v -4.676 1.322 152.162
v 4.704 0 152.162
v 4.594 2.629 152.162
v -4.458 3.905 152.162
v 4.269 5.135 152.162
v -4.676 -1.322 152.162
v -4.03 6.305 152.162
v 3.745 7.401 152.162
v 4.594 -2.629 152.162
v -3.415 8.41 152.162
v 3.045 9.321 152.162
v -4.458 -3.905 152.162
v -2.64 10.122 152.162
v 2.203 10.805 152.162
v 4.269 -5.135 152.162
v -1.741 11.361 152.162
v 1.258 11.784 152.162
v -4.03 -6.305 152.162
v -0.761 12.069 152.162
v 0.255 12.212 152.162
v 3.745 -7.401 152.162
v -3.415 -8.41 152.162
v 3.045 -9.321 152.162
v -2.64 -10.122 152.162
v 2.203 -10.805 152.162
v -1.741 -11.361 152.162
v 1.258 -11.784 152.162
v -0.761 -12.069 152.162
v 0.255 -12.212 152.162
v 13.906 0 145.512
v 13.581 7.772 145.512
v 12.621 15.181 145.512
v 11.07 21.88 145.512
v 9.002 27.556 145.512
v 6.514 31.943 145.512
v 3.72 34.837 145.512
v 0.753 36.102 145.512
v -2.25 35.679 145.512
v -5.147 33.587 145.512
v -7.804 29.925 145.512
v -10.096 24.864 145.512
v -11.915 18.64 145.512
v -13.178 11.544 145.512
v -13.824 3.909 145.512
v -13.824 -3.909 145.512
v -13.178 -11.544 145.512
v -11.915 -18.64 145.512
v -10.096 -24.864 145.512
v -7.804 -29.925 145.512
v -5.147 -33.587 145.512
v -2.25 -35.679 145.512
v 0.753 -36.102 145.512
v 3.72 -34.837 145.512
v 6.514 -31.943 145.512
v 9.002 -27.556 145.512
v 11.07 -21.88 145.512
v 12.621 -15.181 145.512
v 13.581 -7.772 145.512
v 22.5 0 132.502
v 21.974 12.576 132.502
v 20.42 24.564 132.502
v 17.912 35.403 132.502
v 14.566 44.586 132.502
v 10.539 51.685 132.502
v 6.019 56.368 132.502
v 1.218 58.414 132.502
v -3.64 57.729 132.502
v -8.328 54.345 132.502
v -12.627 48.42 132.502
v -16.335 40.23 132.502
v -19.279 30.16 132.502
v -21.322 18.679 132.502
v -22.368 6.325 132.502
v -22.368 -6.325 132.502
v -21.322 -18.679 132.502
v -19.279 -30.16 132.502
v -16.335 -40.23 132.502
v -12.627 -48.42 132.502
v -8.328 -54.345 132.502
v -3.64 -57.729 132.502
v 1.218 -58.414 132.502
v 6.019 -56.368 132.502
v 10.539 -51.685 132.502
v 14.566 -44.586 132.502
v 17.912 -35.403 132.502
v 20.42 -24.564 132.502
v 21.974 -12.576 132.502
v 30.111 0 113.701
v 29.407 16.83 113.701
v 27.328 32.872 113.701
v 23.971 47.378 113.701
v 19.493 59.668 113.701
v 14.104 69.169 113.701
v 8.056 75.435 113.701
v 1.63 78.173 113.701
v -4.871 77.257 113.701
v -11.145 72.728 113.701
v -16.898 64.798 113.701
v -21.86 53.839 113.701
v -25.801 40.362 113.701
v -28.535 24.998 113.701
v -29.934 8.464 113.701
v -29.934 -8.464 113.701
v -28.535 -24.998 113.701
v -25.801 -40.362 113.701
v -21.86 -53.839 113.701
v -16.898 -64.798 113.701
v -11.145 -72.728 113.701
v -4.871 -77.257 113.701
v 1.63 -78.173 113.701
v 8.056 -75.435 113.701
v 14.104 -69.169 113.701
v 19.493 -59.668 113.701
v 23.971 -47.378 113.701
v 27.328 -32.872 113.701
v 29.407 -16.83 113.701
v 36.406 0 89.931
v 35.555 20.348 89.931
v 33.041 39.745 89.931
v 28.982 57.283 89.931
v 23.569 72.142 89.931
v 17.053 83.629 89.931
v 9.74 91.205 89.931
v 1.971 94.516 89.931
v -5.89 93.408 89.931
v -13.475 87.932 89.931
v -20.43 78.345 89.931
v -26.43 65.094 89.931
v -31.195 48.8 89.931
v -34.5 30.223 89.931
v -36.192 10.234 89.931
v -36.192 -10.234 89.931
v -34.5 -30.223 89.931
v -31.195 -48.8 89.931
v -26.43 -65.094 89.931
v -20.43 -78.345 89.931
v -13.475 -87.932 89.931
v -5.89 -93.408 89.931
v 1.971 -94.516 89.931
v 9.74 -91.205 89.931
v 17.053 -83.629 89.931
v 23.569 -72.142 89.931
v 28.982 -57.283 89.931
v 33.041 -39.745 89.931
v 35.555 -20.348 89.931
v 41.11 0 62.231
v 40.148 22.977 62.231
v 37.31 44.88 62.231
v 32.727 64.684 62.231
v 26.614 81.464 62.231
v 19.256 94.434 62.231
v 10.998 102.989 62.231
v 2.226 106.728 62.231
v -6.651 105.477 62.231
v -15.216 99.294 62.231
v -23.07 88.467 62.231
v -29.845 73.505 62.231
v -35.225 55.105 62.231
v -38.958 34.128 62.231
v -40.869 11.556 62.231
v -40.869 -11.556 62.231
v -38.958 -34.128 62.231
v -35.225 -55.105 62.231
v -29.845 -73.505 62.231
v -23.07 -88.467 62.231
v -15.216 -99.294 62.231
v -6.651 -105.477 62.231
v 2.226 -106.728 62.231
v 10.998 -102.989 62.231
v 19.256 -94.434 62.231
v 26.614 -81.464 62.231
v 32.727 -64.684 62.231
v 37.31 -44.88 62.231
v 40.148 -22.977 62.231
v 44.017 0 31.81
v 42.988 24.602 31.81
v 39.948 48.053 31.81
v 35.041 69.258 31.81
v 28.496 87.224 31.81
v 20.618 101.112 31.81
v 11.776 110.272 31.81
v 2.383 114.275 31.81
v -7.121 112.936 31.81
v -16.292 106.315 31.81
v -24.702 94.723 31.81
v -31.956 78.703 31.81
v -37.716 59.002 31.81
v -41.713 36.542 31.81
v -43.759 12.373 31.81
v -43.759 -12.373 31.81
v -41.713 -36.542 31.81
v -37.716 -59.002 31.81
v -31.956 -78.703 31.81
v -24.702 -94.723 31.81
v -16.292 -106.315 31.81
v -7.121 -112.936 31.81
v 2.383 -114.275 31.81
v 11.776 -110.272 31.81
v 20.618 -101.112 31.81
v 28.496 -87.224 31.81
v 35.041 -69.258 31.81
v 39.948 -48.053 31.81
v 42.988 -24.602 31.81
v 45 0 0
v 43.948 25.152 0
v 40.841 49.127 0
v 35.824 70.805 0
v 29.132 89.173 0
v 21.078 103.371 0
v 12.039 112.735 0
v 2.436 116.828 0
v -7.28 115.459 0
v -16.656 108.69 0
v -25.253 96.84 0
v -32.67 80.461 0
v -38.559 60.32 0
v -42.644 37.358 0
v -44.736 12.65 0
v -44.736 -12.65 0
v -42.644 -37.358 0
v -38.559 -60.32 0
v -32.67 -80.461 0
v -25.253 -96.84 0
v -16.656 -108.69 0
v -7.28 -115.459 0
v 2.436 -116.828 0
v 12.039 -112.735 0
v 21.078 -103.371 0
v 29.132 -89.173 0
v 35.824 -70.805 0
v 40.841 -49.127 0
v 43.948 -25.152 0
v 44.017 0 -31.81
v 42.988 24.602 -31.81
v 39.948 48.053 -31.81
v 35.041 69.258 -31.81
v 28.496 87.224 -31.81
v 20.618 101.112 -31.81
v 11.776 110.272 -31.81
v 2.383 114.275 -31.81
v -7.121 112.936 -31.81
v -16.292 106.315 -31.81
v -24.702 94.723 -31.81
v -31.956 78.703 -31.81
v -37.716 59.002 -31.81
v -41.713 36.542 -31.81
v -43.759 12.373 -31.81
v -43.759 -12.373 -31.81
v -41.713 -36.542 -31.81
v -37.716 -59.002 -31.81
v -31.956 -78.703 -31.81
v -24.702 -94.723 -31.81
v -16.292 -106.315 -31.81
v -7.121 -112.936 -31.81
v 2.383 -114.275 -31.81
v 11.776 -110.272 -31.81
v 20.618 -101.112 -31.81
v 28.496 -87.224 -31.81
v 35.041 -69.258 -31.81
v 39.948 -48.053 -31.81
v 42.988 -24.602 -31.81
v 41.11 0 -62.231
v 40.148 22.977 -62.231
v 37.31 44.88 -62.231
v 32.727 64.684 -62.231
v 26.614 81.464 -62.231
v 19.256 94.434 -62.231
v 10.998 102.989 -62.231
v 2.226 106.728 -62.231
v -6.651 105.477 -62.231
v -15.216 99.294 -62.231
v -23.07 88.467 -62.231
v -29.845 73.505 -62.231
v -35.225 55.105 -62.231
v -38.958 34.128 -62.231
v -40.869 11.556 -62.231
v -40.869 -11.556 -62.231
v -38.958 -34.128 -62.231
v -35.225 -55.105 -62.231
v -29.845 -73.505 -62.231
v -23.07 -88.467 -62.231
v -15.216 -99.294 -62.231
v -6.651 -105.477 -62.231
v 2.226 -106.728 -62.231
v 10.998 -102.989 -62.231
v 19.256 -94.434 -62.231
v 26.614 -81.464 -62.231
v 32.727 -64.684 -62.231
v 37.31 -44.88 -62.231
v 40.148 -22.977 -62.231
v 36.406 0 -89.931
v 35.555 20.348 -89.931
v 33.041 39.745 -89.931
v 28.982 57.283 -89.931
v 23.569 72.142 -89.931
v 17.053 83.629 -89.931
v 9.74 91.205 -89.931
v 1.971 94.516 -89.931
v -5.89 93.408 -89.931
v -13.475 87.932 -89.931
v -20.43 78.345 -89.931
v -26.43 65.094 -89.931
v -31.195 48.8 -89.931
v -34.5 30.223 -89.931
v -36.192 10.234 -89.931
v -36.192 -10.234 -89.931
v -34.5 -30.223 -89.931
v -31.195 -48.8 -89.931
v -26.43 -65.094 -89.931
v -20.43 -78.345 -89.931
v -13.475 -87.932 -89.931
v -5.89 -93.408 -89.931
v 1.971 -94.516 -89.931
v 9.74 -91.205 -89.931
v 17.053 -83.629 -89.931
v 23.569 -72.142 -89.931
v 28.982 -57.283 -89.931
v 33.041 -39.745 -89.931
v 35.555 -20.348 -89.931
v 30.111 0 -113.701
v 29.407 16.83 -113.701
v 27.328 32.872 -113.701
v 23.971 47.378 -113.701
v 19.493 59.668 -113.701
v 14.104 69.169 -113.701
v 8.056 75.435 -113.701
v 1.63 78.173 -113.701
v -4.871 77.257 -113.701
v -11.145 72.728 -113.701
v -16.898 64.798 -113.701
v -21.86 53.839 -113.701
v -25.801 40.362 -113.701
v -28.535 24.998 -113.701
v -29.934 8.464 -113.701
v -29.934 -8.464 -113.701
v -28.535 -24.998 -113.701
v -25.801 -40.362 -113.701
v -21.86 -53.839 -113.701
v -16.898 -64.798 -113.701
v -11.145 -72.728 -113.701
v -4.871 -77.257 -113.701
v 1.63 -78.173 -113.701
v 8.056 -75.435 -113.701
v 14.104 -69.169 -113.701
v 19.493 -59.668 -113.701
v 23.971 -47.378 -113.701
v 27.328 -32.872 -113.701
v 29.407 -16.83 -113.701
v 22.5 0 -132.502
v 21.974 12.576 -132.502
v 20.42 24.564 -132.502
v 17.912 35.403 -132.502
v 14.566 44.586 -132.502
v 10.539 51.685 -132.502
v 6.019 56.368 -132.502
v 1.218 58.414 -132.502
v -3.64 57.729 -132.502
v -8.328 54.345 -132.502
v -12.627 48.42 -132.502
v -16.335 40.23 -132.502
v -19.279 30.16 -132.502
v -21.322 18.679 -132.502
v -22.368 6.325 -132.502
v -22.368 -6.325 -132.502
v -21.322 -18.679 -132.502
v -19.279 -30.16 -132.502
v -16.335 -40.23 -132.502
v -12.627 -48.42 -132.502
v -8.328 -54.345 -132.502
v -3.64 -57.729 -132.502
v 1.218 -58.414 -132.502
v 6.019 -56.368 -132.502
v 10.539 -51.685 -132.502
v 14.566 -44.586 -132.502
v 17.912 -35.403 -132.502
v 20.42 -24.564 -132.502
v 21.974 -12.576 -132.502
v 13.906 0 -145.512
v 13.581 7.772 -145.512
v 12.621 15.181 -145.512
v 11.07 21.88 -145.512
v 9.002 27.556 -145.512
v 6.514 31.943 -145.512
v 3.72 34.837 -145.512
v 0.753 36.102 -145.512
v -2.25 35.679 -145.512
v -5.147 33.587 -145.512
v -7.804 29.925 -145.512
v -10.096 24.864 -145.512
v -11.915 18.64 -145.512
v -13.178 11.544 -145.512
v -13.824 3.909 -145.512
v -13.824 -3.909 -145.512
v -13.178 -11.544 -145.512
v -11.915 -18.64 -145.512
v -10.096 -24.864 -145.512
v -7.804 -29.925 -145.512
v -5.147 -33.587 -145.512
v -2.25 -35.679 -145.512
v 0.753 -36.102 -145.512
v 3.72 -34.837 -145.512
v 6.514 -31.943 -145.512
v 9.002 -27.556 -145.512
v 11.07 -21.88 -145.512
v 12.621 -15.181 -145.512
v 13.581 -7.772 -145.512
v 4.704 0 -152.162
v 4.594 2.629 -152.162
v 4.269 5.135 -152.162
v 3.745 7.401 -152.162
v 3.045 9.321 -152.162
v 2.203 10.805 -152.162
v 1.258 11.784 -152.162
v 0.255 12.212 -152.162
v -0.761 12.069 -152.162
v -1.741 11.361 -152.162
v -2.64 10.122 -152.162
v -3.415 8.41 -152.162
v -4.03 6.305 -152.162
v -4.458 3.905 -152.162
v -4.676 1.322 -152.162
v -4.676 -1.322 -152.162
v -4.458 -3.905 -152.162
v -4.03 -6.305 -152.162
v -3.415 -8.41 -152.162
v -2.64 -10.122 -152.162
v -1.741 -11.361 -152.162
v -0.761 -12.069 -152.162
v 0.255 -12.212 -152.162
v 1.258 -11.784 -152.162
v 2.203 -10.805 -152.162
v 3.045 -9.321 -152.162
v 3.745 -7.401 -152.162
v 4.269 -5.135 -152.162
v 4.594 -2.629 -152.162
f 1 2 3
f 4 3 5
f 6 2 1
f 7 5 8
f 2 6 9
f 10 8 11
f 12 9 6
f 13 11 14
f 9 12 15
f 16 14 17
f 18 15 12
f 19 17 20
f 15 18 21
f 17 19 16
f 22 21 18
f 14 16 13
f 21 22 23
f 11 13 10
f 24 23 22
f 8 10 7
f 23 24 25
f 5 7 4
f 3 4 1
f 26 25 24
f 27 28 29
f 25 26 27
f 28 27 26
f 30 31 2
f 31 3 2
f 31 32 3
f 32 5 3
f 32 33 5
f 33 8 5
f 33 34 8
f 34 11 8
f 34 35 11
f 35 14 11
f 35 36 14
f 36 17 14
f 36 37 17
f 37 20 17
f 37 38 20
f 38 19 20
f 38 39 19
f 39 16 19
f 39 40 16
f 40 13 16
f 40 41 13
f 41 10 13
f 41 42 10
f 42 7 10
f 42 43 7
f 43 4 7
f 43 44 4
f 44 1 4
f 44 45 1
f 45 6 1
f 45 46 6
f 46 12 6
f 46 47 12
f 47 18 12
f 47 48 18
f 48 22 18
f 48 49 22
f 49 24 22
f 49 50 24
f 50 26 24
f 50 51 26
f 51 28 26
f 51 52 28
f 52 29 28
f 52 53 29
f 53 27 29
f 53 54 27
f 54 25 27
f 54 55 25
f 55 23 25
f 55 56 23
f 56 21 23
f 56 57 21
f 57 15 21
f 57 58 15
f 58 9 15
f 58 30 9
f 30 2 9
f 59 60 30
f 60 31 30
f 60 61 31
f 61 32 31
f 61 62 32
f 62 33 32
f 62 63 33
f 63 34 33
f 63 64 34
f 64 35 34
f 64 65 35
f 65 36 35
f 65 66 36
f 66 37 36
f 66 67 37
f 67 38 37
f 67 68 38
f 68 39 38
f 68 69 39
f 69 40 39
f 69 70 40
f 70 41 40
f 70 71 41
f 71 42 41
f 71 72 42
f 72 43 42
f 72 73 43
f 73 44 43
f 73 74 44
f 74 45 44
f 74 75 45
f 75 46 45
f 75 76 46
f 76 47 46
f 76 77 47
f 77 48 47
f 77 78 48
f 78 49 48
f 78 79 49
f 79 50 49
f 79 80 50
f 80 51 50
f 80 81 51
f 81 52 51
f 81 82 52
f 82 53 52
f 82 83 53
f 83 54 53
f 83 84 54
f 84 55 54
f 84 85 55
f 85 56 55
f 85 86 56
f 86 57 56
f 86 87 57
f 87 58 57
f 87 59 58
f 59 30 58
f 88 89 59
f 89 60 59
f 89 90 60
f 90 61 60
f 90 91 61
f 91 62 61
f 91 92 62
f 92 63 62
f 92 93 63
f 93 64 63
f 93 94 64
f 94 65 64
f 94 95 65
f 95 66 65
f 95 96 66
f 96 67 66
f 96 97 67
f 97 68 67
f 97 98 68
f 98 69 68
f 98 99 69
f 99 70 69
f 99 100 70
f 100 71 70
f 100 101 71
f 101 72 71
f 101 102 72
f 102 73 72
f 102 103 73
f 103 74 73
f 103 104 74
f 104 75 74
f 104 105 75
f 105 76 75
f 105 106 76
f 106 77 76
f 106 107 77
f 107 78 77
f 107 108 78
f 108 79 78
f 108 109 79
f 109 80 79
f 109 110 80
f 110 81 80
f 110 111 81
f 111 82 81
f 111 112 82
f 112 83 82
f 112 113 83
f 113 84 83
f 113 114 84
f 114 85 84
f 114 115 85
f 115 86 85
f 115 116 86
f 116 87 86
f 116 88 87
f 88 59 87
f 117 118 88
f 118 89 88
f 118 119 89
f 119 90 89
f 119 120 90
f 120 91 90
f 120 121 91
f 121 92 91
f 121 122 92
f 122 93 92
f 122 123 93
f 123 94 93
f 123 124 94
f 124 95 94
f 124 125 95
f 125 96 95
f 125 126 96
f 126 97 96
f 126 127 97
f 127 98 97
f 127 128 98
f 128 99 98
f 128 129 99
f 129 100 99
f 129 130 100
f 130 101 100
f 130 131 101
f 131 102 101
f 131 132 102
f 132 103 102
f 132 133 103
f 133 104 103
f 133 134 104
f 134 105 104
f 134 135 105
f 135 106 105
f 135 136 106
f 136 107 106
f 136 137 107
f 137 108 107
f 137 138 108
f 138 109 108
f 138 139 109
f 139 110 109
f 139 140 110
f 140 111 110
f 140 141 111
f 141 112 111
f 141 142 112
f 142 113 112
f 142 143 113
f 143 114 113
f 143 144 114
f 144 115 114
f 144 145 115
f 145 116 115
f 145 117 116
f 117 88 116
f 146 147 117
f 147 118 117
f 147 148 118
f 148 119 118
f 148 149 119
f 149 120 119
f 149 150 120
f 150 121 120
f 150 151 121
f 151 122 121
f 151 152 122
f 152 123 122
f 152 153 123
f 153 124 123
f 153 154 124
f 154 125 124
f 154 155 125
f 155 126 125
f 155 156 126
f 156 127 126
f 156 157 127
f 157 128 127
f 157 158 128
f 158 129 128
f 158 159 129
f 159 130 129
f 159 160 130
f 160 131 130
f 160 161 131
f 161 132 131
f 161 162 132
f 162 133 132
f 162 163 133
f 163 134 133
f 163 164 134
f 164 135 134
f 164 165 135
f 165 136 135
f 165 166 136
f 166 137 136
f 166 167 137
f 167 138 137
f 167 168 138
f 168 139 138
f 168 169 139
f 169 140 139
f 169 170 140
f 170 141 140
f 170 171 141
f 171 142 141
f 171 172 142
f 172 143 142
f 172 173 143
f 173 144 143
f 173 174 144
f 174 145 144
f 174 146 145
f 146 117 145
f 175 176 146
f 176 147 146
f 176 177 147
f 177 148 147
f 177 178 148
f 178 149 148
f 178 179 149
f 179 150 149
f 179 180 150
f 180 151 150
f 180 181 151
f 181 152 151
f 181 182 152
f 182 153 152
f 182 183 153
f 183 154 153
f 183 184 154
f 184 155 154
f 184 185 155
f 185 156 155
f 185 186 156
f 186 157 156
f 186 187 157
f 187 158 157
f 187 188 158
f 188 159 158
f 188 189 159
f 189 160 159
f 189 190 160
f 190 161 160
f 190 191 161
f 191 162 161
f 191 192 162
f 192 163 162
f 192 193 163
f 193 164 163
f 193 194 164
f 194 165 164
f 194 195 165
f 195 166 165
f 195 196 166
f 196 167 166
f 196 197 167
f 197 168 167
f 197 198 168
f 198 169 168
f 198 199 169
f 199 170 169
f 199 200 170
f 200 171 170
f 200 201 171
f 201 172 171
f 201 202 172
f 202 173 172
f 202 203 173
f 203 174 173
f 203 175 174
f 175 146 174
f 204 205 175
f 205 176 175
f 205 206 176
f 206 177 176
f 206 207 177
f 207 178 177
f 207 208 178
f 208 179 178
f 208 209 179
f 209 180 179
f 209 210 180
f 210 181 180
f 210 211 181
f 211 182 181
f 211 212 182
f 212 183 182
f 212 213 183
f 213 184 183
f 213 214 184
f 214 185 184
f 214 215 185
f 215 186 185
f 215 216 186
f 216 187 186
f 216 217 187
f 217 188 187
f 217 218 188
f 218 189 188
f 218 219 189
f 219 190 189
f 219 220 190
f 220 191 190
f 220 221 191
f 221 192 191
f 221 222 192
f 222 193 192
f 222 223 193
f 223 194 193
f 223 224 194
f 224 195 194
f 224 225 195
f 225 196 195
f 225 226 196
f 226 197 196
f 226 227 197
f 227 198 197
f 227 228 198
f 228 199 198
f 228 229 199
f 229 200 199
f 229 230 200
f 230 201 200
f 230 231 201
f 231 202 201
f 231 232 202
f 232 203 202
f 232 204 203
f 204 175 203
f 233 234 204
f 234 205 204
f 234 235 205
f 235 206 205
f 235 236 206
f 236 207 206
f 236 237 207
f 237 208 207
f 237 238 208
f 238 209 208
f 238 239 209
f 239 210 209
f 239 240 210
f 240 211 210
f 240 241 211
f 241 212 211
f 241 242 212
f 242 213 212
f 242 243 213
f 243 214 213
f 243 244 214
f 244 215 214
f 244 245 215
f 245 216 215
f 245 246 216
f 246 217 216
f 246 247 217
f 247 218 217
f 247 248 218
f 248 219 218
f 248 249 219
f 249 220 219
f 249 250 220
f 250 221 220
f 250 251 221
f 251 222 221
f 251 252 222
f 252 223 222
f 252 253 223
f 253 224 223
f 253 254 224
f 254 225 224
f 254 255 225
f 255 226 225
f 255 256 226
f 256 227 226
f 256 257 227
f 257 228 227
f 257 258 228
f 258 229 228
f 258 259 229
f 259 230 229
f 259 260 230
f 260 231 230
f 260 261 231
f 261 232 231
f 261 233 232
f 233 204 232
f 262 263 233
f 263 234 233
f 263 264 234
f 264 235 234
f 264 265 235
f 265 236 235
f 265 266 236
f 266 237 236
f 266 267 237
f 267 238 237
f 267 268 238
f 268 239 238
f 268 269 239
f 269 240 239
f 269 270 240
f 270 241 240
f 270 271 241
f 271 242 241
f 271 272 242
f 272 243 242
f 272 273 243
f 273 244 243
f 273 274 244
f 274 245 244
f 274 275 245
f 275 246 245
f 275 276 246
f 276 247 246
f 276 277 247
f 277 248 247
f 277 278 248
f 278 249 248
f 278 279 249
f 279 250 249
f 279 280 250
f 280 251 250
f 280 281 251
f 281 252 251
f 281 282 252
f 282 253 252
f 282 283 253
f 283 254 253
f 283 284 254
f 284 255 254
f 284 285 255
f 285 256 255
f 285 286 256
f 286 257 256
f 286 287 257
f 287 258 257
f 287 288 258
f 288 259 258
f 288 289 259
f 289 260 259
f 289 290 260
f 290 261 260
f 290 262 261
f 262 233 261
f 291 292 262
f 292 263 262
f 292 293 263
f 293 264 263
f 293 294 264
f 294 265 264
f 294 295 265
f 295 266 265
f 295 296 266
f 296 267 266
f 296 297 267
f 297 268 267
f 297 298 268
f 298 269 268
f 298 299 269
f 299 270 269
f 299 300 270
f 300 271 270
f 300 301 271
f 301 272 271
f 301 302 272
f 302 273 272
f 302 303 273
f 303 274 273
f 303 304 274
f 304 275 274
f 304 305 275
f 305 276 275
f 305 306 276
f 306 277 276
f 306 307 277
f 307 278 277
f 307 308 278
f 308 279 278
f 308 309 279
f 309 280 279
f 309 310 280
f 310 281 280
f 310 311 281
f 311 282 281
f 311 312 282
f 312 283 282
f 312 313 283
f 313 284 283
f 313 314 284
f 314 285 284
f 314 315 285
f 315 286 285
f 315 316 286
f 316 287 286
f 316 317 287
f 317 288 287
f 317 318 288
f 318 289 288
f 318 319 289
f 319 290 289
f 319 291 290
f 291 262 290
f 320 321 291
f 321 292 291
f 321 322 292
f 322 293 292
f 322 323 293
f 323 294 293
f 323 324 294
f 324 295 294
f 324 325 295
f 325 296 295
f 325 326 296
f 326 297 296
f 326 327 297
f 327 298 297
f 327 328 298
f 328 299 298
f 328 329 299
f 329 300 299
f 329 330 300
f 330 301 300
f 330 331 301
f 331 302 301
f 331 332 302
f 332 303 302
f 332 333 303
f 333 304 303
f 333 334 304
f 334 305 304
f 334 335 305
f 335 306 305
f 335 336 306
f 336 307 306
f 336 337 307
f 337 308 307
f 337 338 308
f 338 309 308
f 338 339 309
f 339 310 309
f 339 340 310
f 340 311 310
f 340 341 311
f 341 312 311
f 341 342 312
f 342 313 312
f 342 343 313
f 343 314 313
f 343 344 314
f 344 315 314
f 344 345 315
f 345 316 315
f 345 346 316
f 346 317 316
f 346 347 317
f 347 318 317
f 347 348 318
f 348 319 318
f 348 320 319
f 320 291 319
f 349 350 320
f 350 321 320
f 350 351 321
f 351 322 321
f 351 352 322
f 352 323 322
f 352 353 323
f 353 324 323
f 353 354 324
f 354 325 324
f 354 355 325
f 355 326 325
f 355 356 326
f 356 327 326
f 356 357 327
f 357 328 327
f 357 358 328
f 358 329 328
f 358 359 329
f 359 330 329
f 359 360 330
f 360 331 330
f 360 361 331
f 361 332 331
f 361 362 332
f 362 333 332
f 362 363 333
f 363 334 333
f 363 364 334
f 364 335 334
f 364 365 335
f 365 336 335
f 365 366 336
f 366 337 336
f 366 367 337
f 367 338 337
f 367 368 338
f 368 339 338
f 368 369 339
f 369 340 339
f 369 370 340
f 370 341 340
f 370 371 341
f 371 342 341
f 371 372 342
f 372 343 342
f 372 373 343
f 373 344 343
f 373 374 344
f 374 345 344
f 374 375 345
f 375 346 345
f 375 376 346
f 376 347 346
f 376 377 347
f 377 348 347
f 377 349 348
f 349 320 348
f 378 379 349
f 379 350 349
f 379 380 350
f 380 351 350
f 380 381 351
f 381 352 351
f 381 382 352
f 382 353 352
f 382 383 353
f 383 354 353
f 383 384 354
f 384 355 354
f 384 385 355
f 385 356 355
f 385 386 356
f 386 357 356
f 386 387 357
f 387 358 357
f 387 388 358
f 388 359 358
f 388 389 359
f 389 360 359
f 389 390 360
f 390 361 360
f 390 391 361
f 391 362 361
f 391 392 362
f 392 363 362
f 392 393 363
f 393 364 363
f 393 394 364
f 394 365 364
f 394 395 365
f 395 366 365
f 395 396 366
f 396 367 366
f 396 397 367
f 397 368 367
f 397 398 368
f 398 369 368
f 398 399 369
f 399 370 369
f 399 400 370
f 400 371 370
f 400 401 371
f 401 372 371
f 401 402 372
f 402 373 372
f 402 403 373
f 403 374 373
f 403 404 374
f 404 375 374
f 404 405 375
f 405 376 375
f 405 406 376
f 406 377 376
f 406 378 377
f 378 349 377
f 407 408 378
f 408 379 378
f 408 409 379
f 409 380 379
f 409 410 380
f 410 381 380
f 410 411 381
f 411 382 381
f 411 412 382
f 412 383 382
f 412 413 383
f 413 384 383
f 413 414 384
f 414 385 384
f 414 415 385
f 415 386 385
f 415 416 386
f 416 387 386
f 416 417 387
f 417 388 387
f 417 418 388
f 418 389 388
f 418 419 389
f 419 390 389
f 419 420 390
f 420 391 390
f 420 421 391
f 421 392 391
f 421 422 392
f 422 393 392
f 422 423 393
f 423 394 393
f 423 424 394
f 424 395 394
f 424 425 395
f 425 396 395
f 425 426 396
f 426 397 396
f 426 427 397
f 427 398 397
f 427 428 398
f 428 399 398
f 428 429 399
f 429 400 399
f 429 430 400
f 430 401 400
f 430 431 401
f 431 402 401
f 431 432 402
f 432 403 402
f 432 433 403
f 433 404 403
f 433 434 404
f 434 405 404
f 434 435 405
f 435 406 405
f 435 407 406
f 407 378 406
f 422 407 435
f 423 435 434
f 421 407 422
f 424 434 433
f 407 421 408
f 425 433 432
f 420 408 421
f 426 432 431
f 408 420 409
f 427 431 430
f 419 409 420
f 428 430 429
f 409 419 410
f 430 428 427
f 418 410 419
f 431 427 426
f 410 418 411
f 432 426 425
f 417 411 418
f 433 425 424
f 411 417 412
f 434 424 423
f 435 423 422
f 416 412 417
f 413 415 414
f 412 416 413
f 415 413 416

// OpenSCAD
// Generated by SolidPython 1.0.1 on 2020-07-29 00:46:46


scale(v = [5, 13, 17]) {
	sphere(r = 9);
}
/***********************************************
*********      SolidPython code:      **********
************************************************
 
# import packages: SolidPython
from solid import *
from solid.utils import *
from itertools import chain, combinations, permutations


class Resize:

    def __init__(self, scad_file):
        self.scad_file = scad_file
        #self.scad_file = import_scad(scad_file)
        # cone/cylinder param:
        self.r1 = 0
        self.r2 = 0
        self.h = 0
        # rectangular prism param:
        self.w = 0
        self.l = 0
        # ellipse param:
        self.r = 0

    # import OpenScad code (file name corresponds to shape)


    # classify shape + parameters
    def assign(self, param1, param2, param3):
        if self.scad_file == 'cone.scad':
            self.r1 = param1
            self.r2 = param2
            self.h = param3
        elif self.scad_file == 'cylinder.scad':
            self.r1 = param1
            self.r2 = param2
            self.h = param3
        elif self.scad_file == 'rectangularPrism.scad':
            self.h = param1
            self.l = param2
            self.w = param3
        else:
            self.r = param1
            self.h = param2

    # resize parameters
    def iterate(self):
        x = range(3, 20, 2)
        i = 1
        if self.scad_file == 'cone.scad':
            tempList = list(permutations(x, 2))
            for temp in tempList:
                param1 = temp[0]
                param2 = temp[1]
                filepath = 'produced_scad_files/' + 'cone' + str(param1) + '_' + str(param2) + '_' + '.scad'
                scad_render_to_file(cylinder(h=param1, r1=param2, r2=0), filepath)

        elif self.scad_file == 'cylinder.scad':
            tempList = list(permutations(x, 3))
            for temp in tempList:
                param1 = temp[0]
                param2 = temp[1]
                filepath = 'produced_scad_files/' + 'cylinder' + str(param1) + '_' + str(param2) + '_' + '.scad'
                scad_render_to_file(cylinder(h=param1, r1=param2, r2=param2), filepath)

        elif self.scad_file == 'rectangularPrism.scad':
            tempList = list(permutations(x, 3))
            for temp in tempList:
                param1 = temp[0]
                param2 = temp[1]
                param3 = temp[2]
                filepath = 'produced_scad_files/' + 'rectangularPrism' + str(param1) + '_' + str(param2) + '_' + str(
                    param3) + '.scad'
                scad_render_to_file(cube(size=(param1, param2, param3)), filepath)

        elif self.scad_file == 'ellipse.scad':
            tempList = list(permutations(x, 4))
            for temp in tempList:
                param1 = temp[0]
                param2 = temp[1]
                param3 = temp[2]
                param4 = temp[3]
                filepath = 'produced_scad_files/' + 'ellipse' + str(param1) + '_' + str(param2) + '_' + str(param3) + '_' + str(param4) + '.scad'
                scad_render_to_file(scale([param1, param2, param3])(sphere(r=param4)), filepath)

    def render_to_scadfile(self):
        scad_render_to_file(scad, 'example.scad') 
 
************************************************/
